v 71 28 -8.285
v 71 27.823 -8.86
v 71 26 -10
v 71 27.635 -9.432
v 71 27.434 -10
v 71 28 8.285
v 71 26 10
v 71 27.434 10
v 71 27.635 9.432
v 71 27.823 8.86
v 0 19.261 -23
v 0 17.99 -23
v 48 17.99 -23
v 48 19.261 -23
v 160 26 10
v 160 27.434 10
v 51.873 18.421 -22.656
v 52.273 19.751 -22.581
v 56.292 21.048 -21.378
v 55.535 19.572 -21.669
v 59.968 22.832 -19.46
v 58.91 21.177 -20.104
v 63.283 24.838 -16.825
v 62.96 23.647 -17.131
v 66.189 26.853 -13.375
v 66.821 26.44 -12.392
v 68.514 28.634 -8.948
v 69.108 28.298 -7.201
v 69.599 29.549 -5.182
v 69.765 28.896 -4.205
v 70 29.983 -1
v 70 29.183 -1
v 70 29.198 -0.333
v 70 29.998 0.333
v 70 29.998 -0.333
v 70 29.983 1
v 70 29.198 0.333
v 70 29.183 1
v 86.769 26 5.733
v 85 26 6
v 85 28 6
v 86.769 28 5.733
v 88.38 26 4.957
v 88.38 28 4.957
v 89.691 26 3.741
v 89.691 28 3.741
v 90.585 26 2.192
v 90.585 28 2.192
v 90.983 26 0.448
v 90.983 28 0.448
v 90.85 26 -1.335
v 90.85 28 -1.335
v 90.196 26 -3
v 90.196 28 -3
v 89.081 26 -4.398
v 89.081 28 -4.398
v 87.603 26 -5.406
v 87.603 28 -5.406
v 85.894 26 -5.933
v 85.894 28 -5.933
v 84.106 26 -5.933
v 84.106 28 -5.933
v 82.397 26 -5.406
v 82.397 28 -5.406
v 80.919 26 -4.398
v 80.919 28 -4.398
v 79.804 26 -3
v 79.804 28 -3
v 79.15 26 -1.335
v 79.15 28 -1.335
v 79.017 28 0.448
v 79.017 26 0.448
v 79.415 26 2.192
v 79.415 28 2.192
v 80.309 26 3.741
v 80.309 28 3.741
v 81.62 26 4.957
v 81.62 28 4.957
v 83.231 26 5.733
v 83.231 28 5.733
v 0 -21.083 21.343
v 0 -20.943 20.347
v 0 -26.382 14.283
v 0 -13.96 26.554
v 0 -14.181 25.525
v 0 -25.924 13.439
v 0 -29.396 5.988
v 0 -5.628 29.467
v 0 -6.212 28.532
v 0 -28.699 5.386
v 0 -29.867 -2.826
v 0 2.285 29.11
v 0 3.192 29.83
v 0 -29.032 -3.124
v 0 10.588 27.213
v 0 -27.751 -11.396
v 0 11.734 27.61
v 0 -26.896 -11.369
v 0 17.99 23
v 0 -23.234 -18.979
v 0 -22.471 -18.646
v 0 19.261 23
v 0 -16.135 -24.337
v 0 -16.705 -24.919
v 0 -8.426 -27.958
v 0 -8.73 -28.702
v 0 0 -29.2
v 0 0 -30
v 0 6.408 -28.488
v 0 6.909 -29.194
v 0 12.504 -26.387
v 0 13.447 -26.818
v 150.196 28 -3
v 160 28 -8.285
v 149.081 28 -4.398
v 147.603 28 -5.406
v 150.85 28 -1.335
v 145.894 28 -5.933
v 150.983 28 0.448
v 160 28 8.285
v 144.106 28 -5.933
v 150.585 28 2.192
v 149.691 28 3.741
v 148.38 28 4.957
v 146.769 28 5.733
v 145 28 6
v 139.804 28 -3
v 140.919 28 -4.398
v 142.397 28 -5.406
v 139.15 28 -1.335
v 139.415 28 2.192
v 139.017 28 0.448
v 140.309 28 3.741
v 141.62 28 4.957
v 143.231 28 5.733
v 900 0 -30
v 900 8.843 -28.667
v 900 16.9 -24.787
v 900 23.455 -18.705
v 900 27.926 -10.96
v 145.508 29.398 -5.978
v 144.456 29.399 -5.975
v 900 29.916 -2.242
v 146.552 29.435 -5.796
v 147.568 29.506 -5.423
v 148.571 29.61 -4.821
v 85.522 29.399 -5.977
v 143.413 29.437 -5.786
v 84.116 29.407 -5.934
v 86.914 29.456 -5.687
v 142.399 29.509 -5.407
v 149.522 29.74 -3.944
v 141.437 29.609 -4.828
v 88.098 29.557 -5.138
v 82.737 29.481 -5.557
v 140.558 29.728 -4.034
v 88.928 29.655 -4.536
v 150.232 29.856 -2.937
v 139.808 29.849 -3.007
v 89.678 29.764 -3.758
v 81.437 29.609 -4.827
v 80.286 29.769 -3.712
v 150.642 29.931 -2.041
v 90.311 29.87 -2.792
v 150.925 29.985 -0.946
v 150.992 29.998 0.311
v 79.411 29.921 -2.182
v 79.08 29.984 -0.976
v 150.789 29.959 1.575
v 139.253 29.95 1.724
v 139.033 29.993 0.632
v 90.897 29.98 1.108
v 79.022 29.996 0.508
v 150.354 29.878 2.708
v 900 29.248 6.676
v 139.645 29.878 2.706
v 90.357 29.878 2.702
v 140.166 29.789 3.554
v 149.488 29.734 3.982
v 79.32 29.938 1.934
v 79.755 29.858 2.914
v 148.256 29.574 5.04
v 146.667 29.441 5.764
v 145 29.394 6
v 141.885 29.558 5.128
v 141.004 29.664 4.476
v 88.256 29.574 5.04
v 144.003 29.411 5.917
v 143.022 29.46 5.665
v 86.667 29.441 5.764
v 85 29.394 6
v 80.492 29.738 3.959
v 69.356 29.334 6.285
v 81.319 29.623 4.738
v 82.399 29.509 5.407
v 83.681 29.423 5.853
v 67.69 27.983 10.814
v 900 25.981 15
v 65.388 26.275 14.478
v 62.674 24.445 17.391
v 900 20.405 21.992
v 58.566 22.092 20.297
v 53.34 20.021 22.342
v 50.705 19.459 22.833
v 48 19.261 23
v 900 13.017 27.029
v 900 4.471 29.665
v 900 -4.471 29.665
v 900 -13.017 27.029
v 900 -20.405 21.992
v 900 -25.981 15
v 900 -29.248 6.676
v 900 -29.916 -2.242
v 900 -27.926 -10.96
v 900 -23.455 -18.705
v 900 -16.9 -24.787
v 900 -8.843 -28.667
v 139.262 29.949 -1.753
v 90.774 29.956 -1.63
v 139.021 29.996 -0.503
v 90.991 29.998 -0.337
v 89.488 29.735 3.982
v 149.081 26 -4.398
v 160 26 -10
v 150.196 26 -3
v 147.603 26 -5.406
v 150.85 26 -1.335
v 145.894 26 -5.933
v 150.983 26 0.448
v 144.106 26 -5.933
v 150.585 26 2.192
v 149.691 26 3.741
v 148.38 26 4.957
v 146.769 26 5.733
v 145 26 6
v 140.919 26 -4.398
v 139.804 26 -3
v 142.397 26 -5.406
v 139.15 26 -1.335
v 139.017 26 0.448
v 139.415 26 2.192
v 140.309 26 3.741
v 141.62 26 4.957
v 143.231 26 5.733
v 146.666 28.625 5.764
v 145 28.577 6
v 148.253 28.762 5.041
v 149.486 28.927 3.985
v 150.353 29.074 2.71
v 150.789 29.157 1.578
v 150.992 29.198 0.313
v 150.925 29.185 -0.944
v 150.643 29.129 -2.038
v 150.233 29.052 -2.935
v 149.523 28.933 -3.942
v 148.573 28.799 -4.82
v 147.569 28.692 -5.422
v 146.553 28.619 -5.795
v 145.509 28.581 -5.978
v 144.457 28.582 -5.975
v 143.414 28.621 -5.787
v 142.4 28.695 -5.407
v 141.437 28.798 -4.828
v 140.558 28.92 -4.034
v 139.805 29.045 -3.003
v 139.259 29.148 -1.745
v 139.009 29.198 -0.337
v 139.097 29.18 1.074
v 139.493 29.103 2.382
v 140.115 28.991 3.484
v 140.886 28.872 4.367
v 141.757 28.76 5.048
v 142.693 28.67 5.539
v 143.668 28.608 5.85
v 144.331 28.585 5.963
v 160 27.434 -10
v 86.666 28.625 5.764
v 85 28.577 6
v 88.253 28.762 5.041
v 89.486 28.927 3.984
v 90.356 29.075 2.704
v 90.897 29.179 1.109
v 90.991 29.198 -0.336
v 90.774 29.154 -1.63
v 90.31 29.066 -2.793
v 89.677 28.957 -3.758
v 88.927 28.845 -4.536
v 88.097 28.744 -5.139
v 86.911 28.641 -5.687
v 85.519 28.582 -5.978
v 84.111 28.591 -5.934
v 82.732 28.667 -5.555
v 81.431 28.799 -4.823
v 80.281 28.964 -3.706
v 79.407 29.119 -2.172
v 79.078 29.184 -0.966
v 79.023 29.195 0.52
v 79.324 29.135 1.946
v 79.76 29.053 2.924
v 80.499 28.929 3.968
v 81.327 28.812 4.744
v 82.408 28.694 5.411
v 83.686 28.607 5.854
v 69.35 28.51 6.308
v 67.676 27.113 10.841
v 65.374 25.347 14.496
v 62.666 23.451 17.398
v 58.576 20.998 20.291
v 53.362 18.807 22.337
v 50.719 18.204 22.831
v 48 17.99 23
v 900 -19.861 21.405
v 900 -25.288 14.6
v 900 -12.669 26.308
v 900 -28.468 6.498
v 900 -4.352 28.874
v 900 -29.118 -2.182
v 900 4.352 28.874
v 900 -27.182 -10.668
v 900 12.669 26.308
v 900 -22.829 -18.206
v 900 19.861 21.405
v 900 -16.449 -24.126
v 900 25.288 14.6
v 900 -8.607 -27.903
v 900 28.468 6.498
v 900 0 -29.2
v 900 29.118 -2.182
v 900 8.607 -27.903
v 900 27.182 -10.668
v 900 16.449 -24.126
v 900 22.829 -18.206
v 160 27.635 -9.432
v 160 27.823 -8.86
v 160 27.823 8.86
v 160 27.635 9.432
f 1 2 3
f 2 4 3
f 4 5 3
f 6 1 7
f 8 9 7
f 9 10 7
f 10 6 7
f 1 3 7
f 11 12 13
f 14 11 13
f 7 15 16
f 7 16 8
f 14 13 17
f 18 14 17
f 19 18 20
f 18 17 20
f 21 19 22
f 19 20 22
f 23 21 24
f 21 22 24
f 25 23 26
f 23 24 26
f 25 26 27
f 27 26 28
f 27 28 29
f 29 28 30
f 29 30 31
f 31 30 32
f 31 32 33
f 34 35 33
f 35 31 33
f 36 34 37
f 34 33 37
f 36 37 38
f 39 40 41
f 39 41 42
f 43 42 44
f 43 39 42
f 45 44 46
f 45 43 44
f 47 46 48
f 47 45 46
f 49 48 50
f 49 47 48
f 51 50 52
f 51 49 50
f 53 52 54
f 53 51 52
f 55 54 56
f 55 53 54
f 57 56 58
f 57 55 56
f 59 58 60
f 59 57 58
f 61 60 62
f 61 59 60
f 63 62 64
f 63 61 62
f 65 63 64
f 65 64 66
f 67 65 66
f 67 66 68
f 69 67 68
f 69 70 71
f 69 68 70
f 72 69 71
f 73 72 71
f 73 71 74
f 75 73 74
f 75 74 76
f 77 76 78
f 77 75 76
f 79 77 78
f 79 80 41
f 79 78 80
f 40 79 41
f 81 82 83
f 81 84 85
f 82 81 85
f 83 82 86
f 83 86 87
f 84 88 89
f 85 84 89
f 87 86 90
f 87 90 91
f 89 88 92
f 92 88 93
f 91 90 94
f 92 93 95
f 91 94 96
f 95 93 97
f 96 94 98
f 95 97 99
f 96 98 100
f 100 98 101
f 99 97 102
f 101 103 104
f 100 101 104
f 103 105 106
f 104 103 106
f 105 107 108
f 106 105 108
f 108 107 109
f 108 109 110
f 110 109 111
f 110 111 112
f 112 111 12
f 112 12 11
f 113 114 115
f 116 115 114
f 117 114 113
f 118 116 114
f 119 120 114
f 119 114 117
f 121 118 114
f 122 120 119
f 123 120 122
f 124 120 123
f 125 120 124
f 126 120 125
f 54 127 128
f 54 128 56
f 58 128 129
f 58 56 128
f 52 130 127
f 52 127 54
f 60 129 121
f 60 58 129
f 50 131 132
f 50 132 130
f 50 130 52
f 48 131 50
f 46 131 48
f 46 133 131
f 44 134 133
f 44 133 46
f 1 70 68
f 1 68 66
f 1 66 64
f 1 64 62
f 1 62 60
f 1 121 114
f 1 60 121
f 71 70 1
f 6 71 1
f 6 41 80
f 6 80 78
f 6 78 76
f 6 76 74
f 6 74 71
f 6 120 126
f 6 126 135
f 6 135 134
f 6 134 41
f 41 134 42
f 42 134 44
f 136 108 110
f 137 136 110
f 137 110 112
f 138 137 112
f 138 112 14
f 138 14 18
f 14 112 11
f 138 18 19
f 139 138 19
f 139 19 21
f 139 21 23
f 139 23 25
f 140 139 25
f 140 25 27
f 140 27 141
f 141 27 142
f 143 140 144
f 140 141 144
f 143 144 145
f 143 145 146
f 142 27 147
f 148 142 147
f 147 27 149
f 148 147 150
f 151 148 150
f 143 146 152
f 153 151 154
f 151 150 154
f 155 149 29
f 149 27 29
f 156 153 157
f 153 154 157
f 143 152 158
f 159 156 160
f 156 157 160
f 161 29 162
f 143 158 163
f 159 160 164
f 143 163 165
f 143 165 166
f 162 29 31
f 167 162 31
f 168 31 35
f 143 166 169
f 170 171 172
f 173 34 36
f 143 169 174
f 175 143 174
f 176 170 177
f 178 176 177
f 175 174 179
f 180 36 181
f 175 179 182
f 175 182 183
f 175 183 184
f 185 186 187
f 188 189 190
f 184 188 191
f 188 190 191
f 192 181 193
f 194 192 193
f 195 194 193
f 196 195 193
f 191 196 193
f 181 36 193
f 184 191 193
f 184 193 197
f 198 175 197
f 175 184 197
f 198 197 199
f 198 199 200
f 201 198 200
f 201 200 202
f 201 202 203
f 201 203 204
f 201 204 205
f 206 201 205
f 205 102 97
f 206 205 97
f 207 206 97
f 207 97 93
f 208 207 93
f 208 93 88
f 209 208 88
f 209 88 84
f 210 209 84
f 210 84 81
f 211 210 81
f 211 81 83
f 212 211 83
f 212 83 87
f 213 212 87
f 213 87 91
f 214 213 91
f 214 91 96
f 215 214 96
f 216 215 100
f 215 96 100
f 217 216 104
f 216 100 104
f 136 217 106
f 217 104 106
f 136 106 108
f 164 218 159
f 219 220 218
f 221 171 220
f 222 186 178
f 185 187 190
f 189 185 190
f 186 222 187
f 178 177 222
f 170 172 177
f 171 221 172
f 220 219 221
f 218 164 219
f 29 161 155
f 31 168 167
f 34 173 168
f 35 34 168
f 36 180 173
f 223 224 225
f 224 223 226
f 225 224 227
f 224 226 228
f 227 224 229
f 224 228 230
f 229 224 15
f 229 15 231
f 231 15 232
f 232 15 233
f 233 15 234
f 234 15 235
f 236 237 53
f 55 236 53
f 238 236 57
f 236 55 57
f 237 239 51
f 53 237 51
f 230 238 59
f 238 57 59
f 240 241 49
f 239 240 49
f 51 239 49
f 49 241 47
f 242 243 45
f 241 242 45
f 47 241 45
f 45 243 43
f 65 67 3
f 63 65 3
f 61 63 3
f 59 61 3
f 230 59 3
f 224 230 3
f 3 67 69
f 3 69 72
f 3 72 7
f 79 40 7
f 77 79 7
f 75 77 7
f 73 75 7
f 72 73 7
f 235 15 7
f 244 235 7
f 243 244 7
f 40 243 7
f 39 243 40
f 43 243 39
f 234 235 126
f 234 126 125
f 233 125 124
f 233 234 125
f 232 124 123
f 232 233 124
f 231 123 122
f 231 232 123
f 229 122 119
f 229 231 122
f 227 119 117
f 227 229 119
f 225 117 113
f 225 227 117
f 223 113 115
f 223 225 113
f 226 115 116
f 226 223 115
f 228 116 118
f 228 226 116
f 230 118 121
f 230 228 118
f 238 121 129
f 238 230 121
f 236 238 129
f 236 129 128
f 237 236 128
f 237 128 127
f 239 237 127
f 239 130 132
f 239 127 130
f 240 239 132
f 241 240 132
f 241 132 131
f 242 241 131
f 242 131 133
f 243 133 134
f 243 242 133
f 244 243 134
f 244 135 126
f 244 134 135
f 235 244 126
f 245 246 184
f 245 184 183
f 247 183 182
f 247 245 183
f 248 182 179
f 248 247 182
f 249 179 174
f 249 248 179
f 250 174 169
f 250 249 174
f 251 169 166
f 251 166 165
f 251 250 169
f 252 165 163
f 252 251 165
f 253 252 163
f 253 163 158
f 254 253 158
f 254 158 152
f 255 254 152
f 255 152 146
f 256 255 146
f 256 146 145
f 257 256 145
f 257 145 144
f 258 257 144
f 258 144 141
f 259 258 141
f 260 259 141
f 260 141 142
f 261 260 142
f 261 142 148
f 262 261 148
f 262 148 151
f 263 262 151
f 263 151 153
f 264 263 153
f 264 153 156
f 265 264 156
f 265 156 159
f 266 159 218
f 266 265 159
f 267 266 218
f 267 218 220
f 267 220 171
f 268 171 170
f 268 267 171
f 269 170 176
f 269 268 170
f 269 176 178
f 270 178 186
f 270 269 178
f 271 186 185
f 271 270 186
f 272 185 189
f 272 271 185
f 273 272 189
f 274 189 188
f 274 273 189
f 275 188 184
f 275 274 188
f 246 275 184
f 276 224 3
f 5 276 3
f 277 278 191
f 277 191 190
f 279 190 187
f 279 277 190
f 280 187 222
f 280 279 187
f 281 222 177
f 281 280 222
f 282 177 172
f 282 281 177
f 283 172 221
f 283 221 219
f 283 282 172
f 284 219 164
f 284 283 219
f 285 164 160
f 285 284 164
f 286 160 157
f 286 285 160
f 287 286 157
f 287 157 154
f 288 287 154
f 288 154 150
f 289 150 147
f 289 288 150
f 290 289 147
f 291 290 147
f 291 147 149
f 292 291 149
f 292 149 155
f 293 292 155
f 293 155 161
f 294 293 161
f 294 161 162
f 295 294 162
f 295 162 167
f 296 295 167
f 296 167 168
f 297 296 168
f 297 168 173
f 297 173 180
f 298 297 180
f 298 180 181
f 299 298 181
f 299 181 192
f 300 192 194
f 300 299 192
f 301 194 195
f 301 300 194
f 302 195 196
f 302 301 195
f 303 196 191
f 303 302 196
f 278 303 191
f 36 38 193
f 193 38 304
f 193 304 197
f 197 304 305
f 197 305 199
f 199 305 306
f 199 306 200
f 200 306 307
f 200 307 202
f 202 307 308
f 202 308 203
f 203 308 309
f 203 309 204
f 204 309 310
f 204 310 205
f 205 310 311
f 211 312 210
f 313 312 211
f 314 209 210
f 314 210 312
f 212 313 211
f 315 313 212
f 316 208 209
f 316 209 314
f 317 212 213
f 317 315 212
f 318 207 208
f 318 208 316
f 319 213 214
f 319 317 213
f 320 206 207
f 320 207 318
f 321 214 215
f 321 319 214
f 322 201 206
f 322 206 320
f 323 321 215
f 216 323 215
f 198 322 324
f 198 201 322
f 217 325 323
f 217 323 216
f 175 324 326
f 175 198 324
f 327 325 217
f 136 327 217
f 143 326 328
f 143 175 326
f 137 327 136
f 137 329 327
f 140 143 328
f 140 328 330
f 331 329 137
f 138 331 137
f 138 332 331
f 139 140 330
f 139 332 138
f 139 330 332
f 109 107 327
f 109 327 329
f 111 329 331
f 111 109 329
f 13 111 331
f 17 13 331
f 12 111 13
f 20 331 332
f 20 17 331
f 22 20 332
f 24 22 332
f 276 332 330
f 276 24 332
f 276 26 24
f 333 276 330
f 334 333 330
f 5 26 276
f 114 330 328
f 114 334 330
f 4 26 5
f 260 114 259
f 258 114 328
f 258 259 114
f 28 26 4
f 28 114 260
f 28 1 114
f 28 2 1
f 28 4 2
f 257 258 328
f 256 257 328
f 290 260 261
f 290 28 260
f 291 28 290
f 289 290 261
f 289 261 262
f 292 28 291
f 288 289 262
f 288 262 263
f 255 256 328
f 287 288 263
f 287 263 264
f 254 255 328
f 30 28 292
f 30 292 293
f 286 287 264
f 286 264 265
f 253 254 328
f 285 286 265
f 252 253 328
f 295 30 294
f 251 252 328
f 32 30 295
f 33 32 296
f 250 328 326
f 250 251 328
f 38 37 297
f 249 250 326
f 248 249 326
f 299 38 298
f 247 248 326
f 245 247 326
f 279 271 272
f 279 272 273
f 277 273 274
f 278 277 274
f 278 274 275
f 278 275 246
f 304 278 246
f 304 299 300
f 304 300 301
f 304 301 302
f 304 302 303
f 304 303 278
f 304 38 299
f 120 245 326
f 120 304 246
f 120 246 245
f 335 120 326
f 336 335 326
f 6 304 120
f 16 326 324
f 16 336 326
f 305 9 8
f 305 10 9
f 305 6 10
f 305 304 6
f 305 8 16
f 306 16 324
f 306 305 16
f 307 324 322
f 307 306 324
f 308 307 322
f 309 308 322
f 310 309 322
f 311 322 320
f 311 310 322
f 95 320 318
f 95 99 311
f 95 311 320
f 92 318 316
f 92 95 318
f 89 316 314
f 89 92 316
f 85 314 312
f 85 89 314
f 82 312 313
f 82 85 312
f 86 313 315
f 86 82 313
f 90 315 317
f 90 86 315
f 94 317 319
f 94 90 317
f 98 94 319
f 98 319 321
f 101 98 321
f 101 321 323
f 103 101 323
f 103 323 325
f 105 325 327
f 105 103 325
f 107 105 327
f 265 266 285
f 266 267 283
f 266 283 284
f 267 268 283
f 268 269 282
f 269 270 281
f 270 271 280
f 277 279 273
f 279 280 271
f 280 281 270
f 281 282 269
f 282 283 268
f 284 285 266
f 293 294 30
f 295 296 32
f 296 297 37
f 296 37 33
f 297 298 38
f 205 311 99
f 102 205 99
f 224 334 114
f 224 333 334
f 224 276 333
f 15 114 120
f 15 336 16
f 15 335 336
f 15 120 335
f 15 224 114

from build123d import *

# Parameters (mm, degrees)
ESQUISSE1_R             = 30
BASE_EXTRUSION_DEPTH    = 900
COQUE1_T                = -0.8
ENL_V_MAT_EXTRU_1_DEPTH = 100
ESQUISSE4_W             = 89
ESQUISSE4_H             = 20
BOSS_EXTRU_1_DEPTH      = 2
ESQUISSE3_R             = 6
ENL_V_MAT_EXTRU_2_DEPTH = 100


with BuildPart() as part:
    # Esquisse1 → Base-Extrusion (new body)
    with BuildSketch(Plane(origin=(0, 0, 0), x_dir=(0, 0, -1), z_dir=(1, 0, 0))):
        Circle(ESQUISSE1_R)
    extrude(amount=BASE_EXTRUSION_DEPTH)

    # Coque1
    coque1_openings = [part.faces().sort_by_distance(p)[0] for p in [
        (900, 0, 0),
        (0, 0, 0),
    ]]
    offset(amount=COQUE1_T, openings=coque1_openings, kind=Kind.INTERSECTION)

    # Esquisse2 → Enlèv. mat.-Extru.1 (cut)
    with BuildSketch(Plane(origin=(0, 0, 0), x_dir=(1, 0, 0), z_dir=(0, 1, 0))):
        with BuildLine():
            Line((-10, 23), (48, 23))
            ThreePointArc((48, 23), (63.556349186, 16.556349186), (70, 1))
            Line((70, 1), (70, -1))
            ThreePointArc((70, -1), (63.556349186, -16.556349186), (48, -23))
            Line((48, -23), (-10, -23))
            Line((-10, -23), (-10, 23))
        make_face()
    extrude(amount=ENL_V_MAT_EXTRU_1_DEPTH, mode=Mode.SUBTRACT)

    # Esquisse4 → Boss.-Extru.1 (add)
    with BuildSketch(Plane(origin=(0, 26, 0), x_dir=(-1, 0, 0), z_dir=(0, 1, 0))):
        with Locations((-115.5, 0)):
            Rectangle(ESQUISSE4_W, ESQUISSE4_H)
    extrude(amount=BOSS_EXTRU_1_DEPTH)

    # Esquisse3 → Enlèv. mat.-Extru.2 (cut)
    with BuildSketch(Plane(origin=(0, 0, 0), x_dir=(1, 0, 0), z_dir=(0, 1, 0))):
        with Locations(Location((85, 0, 0), (0, 0, 270))):
            Circle(ESQUISSE3_R)
        with Locations(Location((145, 0, 0), (0, 0, 270))):
            Circle(ESQUISSE3_R)
    extrude(amount=ENL_V_MAT_EXTRU_2_DEPTH, mode=Mode.SUBTRACT)


solid = part.part
